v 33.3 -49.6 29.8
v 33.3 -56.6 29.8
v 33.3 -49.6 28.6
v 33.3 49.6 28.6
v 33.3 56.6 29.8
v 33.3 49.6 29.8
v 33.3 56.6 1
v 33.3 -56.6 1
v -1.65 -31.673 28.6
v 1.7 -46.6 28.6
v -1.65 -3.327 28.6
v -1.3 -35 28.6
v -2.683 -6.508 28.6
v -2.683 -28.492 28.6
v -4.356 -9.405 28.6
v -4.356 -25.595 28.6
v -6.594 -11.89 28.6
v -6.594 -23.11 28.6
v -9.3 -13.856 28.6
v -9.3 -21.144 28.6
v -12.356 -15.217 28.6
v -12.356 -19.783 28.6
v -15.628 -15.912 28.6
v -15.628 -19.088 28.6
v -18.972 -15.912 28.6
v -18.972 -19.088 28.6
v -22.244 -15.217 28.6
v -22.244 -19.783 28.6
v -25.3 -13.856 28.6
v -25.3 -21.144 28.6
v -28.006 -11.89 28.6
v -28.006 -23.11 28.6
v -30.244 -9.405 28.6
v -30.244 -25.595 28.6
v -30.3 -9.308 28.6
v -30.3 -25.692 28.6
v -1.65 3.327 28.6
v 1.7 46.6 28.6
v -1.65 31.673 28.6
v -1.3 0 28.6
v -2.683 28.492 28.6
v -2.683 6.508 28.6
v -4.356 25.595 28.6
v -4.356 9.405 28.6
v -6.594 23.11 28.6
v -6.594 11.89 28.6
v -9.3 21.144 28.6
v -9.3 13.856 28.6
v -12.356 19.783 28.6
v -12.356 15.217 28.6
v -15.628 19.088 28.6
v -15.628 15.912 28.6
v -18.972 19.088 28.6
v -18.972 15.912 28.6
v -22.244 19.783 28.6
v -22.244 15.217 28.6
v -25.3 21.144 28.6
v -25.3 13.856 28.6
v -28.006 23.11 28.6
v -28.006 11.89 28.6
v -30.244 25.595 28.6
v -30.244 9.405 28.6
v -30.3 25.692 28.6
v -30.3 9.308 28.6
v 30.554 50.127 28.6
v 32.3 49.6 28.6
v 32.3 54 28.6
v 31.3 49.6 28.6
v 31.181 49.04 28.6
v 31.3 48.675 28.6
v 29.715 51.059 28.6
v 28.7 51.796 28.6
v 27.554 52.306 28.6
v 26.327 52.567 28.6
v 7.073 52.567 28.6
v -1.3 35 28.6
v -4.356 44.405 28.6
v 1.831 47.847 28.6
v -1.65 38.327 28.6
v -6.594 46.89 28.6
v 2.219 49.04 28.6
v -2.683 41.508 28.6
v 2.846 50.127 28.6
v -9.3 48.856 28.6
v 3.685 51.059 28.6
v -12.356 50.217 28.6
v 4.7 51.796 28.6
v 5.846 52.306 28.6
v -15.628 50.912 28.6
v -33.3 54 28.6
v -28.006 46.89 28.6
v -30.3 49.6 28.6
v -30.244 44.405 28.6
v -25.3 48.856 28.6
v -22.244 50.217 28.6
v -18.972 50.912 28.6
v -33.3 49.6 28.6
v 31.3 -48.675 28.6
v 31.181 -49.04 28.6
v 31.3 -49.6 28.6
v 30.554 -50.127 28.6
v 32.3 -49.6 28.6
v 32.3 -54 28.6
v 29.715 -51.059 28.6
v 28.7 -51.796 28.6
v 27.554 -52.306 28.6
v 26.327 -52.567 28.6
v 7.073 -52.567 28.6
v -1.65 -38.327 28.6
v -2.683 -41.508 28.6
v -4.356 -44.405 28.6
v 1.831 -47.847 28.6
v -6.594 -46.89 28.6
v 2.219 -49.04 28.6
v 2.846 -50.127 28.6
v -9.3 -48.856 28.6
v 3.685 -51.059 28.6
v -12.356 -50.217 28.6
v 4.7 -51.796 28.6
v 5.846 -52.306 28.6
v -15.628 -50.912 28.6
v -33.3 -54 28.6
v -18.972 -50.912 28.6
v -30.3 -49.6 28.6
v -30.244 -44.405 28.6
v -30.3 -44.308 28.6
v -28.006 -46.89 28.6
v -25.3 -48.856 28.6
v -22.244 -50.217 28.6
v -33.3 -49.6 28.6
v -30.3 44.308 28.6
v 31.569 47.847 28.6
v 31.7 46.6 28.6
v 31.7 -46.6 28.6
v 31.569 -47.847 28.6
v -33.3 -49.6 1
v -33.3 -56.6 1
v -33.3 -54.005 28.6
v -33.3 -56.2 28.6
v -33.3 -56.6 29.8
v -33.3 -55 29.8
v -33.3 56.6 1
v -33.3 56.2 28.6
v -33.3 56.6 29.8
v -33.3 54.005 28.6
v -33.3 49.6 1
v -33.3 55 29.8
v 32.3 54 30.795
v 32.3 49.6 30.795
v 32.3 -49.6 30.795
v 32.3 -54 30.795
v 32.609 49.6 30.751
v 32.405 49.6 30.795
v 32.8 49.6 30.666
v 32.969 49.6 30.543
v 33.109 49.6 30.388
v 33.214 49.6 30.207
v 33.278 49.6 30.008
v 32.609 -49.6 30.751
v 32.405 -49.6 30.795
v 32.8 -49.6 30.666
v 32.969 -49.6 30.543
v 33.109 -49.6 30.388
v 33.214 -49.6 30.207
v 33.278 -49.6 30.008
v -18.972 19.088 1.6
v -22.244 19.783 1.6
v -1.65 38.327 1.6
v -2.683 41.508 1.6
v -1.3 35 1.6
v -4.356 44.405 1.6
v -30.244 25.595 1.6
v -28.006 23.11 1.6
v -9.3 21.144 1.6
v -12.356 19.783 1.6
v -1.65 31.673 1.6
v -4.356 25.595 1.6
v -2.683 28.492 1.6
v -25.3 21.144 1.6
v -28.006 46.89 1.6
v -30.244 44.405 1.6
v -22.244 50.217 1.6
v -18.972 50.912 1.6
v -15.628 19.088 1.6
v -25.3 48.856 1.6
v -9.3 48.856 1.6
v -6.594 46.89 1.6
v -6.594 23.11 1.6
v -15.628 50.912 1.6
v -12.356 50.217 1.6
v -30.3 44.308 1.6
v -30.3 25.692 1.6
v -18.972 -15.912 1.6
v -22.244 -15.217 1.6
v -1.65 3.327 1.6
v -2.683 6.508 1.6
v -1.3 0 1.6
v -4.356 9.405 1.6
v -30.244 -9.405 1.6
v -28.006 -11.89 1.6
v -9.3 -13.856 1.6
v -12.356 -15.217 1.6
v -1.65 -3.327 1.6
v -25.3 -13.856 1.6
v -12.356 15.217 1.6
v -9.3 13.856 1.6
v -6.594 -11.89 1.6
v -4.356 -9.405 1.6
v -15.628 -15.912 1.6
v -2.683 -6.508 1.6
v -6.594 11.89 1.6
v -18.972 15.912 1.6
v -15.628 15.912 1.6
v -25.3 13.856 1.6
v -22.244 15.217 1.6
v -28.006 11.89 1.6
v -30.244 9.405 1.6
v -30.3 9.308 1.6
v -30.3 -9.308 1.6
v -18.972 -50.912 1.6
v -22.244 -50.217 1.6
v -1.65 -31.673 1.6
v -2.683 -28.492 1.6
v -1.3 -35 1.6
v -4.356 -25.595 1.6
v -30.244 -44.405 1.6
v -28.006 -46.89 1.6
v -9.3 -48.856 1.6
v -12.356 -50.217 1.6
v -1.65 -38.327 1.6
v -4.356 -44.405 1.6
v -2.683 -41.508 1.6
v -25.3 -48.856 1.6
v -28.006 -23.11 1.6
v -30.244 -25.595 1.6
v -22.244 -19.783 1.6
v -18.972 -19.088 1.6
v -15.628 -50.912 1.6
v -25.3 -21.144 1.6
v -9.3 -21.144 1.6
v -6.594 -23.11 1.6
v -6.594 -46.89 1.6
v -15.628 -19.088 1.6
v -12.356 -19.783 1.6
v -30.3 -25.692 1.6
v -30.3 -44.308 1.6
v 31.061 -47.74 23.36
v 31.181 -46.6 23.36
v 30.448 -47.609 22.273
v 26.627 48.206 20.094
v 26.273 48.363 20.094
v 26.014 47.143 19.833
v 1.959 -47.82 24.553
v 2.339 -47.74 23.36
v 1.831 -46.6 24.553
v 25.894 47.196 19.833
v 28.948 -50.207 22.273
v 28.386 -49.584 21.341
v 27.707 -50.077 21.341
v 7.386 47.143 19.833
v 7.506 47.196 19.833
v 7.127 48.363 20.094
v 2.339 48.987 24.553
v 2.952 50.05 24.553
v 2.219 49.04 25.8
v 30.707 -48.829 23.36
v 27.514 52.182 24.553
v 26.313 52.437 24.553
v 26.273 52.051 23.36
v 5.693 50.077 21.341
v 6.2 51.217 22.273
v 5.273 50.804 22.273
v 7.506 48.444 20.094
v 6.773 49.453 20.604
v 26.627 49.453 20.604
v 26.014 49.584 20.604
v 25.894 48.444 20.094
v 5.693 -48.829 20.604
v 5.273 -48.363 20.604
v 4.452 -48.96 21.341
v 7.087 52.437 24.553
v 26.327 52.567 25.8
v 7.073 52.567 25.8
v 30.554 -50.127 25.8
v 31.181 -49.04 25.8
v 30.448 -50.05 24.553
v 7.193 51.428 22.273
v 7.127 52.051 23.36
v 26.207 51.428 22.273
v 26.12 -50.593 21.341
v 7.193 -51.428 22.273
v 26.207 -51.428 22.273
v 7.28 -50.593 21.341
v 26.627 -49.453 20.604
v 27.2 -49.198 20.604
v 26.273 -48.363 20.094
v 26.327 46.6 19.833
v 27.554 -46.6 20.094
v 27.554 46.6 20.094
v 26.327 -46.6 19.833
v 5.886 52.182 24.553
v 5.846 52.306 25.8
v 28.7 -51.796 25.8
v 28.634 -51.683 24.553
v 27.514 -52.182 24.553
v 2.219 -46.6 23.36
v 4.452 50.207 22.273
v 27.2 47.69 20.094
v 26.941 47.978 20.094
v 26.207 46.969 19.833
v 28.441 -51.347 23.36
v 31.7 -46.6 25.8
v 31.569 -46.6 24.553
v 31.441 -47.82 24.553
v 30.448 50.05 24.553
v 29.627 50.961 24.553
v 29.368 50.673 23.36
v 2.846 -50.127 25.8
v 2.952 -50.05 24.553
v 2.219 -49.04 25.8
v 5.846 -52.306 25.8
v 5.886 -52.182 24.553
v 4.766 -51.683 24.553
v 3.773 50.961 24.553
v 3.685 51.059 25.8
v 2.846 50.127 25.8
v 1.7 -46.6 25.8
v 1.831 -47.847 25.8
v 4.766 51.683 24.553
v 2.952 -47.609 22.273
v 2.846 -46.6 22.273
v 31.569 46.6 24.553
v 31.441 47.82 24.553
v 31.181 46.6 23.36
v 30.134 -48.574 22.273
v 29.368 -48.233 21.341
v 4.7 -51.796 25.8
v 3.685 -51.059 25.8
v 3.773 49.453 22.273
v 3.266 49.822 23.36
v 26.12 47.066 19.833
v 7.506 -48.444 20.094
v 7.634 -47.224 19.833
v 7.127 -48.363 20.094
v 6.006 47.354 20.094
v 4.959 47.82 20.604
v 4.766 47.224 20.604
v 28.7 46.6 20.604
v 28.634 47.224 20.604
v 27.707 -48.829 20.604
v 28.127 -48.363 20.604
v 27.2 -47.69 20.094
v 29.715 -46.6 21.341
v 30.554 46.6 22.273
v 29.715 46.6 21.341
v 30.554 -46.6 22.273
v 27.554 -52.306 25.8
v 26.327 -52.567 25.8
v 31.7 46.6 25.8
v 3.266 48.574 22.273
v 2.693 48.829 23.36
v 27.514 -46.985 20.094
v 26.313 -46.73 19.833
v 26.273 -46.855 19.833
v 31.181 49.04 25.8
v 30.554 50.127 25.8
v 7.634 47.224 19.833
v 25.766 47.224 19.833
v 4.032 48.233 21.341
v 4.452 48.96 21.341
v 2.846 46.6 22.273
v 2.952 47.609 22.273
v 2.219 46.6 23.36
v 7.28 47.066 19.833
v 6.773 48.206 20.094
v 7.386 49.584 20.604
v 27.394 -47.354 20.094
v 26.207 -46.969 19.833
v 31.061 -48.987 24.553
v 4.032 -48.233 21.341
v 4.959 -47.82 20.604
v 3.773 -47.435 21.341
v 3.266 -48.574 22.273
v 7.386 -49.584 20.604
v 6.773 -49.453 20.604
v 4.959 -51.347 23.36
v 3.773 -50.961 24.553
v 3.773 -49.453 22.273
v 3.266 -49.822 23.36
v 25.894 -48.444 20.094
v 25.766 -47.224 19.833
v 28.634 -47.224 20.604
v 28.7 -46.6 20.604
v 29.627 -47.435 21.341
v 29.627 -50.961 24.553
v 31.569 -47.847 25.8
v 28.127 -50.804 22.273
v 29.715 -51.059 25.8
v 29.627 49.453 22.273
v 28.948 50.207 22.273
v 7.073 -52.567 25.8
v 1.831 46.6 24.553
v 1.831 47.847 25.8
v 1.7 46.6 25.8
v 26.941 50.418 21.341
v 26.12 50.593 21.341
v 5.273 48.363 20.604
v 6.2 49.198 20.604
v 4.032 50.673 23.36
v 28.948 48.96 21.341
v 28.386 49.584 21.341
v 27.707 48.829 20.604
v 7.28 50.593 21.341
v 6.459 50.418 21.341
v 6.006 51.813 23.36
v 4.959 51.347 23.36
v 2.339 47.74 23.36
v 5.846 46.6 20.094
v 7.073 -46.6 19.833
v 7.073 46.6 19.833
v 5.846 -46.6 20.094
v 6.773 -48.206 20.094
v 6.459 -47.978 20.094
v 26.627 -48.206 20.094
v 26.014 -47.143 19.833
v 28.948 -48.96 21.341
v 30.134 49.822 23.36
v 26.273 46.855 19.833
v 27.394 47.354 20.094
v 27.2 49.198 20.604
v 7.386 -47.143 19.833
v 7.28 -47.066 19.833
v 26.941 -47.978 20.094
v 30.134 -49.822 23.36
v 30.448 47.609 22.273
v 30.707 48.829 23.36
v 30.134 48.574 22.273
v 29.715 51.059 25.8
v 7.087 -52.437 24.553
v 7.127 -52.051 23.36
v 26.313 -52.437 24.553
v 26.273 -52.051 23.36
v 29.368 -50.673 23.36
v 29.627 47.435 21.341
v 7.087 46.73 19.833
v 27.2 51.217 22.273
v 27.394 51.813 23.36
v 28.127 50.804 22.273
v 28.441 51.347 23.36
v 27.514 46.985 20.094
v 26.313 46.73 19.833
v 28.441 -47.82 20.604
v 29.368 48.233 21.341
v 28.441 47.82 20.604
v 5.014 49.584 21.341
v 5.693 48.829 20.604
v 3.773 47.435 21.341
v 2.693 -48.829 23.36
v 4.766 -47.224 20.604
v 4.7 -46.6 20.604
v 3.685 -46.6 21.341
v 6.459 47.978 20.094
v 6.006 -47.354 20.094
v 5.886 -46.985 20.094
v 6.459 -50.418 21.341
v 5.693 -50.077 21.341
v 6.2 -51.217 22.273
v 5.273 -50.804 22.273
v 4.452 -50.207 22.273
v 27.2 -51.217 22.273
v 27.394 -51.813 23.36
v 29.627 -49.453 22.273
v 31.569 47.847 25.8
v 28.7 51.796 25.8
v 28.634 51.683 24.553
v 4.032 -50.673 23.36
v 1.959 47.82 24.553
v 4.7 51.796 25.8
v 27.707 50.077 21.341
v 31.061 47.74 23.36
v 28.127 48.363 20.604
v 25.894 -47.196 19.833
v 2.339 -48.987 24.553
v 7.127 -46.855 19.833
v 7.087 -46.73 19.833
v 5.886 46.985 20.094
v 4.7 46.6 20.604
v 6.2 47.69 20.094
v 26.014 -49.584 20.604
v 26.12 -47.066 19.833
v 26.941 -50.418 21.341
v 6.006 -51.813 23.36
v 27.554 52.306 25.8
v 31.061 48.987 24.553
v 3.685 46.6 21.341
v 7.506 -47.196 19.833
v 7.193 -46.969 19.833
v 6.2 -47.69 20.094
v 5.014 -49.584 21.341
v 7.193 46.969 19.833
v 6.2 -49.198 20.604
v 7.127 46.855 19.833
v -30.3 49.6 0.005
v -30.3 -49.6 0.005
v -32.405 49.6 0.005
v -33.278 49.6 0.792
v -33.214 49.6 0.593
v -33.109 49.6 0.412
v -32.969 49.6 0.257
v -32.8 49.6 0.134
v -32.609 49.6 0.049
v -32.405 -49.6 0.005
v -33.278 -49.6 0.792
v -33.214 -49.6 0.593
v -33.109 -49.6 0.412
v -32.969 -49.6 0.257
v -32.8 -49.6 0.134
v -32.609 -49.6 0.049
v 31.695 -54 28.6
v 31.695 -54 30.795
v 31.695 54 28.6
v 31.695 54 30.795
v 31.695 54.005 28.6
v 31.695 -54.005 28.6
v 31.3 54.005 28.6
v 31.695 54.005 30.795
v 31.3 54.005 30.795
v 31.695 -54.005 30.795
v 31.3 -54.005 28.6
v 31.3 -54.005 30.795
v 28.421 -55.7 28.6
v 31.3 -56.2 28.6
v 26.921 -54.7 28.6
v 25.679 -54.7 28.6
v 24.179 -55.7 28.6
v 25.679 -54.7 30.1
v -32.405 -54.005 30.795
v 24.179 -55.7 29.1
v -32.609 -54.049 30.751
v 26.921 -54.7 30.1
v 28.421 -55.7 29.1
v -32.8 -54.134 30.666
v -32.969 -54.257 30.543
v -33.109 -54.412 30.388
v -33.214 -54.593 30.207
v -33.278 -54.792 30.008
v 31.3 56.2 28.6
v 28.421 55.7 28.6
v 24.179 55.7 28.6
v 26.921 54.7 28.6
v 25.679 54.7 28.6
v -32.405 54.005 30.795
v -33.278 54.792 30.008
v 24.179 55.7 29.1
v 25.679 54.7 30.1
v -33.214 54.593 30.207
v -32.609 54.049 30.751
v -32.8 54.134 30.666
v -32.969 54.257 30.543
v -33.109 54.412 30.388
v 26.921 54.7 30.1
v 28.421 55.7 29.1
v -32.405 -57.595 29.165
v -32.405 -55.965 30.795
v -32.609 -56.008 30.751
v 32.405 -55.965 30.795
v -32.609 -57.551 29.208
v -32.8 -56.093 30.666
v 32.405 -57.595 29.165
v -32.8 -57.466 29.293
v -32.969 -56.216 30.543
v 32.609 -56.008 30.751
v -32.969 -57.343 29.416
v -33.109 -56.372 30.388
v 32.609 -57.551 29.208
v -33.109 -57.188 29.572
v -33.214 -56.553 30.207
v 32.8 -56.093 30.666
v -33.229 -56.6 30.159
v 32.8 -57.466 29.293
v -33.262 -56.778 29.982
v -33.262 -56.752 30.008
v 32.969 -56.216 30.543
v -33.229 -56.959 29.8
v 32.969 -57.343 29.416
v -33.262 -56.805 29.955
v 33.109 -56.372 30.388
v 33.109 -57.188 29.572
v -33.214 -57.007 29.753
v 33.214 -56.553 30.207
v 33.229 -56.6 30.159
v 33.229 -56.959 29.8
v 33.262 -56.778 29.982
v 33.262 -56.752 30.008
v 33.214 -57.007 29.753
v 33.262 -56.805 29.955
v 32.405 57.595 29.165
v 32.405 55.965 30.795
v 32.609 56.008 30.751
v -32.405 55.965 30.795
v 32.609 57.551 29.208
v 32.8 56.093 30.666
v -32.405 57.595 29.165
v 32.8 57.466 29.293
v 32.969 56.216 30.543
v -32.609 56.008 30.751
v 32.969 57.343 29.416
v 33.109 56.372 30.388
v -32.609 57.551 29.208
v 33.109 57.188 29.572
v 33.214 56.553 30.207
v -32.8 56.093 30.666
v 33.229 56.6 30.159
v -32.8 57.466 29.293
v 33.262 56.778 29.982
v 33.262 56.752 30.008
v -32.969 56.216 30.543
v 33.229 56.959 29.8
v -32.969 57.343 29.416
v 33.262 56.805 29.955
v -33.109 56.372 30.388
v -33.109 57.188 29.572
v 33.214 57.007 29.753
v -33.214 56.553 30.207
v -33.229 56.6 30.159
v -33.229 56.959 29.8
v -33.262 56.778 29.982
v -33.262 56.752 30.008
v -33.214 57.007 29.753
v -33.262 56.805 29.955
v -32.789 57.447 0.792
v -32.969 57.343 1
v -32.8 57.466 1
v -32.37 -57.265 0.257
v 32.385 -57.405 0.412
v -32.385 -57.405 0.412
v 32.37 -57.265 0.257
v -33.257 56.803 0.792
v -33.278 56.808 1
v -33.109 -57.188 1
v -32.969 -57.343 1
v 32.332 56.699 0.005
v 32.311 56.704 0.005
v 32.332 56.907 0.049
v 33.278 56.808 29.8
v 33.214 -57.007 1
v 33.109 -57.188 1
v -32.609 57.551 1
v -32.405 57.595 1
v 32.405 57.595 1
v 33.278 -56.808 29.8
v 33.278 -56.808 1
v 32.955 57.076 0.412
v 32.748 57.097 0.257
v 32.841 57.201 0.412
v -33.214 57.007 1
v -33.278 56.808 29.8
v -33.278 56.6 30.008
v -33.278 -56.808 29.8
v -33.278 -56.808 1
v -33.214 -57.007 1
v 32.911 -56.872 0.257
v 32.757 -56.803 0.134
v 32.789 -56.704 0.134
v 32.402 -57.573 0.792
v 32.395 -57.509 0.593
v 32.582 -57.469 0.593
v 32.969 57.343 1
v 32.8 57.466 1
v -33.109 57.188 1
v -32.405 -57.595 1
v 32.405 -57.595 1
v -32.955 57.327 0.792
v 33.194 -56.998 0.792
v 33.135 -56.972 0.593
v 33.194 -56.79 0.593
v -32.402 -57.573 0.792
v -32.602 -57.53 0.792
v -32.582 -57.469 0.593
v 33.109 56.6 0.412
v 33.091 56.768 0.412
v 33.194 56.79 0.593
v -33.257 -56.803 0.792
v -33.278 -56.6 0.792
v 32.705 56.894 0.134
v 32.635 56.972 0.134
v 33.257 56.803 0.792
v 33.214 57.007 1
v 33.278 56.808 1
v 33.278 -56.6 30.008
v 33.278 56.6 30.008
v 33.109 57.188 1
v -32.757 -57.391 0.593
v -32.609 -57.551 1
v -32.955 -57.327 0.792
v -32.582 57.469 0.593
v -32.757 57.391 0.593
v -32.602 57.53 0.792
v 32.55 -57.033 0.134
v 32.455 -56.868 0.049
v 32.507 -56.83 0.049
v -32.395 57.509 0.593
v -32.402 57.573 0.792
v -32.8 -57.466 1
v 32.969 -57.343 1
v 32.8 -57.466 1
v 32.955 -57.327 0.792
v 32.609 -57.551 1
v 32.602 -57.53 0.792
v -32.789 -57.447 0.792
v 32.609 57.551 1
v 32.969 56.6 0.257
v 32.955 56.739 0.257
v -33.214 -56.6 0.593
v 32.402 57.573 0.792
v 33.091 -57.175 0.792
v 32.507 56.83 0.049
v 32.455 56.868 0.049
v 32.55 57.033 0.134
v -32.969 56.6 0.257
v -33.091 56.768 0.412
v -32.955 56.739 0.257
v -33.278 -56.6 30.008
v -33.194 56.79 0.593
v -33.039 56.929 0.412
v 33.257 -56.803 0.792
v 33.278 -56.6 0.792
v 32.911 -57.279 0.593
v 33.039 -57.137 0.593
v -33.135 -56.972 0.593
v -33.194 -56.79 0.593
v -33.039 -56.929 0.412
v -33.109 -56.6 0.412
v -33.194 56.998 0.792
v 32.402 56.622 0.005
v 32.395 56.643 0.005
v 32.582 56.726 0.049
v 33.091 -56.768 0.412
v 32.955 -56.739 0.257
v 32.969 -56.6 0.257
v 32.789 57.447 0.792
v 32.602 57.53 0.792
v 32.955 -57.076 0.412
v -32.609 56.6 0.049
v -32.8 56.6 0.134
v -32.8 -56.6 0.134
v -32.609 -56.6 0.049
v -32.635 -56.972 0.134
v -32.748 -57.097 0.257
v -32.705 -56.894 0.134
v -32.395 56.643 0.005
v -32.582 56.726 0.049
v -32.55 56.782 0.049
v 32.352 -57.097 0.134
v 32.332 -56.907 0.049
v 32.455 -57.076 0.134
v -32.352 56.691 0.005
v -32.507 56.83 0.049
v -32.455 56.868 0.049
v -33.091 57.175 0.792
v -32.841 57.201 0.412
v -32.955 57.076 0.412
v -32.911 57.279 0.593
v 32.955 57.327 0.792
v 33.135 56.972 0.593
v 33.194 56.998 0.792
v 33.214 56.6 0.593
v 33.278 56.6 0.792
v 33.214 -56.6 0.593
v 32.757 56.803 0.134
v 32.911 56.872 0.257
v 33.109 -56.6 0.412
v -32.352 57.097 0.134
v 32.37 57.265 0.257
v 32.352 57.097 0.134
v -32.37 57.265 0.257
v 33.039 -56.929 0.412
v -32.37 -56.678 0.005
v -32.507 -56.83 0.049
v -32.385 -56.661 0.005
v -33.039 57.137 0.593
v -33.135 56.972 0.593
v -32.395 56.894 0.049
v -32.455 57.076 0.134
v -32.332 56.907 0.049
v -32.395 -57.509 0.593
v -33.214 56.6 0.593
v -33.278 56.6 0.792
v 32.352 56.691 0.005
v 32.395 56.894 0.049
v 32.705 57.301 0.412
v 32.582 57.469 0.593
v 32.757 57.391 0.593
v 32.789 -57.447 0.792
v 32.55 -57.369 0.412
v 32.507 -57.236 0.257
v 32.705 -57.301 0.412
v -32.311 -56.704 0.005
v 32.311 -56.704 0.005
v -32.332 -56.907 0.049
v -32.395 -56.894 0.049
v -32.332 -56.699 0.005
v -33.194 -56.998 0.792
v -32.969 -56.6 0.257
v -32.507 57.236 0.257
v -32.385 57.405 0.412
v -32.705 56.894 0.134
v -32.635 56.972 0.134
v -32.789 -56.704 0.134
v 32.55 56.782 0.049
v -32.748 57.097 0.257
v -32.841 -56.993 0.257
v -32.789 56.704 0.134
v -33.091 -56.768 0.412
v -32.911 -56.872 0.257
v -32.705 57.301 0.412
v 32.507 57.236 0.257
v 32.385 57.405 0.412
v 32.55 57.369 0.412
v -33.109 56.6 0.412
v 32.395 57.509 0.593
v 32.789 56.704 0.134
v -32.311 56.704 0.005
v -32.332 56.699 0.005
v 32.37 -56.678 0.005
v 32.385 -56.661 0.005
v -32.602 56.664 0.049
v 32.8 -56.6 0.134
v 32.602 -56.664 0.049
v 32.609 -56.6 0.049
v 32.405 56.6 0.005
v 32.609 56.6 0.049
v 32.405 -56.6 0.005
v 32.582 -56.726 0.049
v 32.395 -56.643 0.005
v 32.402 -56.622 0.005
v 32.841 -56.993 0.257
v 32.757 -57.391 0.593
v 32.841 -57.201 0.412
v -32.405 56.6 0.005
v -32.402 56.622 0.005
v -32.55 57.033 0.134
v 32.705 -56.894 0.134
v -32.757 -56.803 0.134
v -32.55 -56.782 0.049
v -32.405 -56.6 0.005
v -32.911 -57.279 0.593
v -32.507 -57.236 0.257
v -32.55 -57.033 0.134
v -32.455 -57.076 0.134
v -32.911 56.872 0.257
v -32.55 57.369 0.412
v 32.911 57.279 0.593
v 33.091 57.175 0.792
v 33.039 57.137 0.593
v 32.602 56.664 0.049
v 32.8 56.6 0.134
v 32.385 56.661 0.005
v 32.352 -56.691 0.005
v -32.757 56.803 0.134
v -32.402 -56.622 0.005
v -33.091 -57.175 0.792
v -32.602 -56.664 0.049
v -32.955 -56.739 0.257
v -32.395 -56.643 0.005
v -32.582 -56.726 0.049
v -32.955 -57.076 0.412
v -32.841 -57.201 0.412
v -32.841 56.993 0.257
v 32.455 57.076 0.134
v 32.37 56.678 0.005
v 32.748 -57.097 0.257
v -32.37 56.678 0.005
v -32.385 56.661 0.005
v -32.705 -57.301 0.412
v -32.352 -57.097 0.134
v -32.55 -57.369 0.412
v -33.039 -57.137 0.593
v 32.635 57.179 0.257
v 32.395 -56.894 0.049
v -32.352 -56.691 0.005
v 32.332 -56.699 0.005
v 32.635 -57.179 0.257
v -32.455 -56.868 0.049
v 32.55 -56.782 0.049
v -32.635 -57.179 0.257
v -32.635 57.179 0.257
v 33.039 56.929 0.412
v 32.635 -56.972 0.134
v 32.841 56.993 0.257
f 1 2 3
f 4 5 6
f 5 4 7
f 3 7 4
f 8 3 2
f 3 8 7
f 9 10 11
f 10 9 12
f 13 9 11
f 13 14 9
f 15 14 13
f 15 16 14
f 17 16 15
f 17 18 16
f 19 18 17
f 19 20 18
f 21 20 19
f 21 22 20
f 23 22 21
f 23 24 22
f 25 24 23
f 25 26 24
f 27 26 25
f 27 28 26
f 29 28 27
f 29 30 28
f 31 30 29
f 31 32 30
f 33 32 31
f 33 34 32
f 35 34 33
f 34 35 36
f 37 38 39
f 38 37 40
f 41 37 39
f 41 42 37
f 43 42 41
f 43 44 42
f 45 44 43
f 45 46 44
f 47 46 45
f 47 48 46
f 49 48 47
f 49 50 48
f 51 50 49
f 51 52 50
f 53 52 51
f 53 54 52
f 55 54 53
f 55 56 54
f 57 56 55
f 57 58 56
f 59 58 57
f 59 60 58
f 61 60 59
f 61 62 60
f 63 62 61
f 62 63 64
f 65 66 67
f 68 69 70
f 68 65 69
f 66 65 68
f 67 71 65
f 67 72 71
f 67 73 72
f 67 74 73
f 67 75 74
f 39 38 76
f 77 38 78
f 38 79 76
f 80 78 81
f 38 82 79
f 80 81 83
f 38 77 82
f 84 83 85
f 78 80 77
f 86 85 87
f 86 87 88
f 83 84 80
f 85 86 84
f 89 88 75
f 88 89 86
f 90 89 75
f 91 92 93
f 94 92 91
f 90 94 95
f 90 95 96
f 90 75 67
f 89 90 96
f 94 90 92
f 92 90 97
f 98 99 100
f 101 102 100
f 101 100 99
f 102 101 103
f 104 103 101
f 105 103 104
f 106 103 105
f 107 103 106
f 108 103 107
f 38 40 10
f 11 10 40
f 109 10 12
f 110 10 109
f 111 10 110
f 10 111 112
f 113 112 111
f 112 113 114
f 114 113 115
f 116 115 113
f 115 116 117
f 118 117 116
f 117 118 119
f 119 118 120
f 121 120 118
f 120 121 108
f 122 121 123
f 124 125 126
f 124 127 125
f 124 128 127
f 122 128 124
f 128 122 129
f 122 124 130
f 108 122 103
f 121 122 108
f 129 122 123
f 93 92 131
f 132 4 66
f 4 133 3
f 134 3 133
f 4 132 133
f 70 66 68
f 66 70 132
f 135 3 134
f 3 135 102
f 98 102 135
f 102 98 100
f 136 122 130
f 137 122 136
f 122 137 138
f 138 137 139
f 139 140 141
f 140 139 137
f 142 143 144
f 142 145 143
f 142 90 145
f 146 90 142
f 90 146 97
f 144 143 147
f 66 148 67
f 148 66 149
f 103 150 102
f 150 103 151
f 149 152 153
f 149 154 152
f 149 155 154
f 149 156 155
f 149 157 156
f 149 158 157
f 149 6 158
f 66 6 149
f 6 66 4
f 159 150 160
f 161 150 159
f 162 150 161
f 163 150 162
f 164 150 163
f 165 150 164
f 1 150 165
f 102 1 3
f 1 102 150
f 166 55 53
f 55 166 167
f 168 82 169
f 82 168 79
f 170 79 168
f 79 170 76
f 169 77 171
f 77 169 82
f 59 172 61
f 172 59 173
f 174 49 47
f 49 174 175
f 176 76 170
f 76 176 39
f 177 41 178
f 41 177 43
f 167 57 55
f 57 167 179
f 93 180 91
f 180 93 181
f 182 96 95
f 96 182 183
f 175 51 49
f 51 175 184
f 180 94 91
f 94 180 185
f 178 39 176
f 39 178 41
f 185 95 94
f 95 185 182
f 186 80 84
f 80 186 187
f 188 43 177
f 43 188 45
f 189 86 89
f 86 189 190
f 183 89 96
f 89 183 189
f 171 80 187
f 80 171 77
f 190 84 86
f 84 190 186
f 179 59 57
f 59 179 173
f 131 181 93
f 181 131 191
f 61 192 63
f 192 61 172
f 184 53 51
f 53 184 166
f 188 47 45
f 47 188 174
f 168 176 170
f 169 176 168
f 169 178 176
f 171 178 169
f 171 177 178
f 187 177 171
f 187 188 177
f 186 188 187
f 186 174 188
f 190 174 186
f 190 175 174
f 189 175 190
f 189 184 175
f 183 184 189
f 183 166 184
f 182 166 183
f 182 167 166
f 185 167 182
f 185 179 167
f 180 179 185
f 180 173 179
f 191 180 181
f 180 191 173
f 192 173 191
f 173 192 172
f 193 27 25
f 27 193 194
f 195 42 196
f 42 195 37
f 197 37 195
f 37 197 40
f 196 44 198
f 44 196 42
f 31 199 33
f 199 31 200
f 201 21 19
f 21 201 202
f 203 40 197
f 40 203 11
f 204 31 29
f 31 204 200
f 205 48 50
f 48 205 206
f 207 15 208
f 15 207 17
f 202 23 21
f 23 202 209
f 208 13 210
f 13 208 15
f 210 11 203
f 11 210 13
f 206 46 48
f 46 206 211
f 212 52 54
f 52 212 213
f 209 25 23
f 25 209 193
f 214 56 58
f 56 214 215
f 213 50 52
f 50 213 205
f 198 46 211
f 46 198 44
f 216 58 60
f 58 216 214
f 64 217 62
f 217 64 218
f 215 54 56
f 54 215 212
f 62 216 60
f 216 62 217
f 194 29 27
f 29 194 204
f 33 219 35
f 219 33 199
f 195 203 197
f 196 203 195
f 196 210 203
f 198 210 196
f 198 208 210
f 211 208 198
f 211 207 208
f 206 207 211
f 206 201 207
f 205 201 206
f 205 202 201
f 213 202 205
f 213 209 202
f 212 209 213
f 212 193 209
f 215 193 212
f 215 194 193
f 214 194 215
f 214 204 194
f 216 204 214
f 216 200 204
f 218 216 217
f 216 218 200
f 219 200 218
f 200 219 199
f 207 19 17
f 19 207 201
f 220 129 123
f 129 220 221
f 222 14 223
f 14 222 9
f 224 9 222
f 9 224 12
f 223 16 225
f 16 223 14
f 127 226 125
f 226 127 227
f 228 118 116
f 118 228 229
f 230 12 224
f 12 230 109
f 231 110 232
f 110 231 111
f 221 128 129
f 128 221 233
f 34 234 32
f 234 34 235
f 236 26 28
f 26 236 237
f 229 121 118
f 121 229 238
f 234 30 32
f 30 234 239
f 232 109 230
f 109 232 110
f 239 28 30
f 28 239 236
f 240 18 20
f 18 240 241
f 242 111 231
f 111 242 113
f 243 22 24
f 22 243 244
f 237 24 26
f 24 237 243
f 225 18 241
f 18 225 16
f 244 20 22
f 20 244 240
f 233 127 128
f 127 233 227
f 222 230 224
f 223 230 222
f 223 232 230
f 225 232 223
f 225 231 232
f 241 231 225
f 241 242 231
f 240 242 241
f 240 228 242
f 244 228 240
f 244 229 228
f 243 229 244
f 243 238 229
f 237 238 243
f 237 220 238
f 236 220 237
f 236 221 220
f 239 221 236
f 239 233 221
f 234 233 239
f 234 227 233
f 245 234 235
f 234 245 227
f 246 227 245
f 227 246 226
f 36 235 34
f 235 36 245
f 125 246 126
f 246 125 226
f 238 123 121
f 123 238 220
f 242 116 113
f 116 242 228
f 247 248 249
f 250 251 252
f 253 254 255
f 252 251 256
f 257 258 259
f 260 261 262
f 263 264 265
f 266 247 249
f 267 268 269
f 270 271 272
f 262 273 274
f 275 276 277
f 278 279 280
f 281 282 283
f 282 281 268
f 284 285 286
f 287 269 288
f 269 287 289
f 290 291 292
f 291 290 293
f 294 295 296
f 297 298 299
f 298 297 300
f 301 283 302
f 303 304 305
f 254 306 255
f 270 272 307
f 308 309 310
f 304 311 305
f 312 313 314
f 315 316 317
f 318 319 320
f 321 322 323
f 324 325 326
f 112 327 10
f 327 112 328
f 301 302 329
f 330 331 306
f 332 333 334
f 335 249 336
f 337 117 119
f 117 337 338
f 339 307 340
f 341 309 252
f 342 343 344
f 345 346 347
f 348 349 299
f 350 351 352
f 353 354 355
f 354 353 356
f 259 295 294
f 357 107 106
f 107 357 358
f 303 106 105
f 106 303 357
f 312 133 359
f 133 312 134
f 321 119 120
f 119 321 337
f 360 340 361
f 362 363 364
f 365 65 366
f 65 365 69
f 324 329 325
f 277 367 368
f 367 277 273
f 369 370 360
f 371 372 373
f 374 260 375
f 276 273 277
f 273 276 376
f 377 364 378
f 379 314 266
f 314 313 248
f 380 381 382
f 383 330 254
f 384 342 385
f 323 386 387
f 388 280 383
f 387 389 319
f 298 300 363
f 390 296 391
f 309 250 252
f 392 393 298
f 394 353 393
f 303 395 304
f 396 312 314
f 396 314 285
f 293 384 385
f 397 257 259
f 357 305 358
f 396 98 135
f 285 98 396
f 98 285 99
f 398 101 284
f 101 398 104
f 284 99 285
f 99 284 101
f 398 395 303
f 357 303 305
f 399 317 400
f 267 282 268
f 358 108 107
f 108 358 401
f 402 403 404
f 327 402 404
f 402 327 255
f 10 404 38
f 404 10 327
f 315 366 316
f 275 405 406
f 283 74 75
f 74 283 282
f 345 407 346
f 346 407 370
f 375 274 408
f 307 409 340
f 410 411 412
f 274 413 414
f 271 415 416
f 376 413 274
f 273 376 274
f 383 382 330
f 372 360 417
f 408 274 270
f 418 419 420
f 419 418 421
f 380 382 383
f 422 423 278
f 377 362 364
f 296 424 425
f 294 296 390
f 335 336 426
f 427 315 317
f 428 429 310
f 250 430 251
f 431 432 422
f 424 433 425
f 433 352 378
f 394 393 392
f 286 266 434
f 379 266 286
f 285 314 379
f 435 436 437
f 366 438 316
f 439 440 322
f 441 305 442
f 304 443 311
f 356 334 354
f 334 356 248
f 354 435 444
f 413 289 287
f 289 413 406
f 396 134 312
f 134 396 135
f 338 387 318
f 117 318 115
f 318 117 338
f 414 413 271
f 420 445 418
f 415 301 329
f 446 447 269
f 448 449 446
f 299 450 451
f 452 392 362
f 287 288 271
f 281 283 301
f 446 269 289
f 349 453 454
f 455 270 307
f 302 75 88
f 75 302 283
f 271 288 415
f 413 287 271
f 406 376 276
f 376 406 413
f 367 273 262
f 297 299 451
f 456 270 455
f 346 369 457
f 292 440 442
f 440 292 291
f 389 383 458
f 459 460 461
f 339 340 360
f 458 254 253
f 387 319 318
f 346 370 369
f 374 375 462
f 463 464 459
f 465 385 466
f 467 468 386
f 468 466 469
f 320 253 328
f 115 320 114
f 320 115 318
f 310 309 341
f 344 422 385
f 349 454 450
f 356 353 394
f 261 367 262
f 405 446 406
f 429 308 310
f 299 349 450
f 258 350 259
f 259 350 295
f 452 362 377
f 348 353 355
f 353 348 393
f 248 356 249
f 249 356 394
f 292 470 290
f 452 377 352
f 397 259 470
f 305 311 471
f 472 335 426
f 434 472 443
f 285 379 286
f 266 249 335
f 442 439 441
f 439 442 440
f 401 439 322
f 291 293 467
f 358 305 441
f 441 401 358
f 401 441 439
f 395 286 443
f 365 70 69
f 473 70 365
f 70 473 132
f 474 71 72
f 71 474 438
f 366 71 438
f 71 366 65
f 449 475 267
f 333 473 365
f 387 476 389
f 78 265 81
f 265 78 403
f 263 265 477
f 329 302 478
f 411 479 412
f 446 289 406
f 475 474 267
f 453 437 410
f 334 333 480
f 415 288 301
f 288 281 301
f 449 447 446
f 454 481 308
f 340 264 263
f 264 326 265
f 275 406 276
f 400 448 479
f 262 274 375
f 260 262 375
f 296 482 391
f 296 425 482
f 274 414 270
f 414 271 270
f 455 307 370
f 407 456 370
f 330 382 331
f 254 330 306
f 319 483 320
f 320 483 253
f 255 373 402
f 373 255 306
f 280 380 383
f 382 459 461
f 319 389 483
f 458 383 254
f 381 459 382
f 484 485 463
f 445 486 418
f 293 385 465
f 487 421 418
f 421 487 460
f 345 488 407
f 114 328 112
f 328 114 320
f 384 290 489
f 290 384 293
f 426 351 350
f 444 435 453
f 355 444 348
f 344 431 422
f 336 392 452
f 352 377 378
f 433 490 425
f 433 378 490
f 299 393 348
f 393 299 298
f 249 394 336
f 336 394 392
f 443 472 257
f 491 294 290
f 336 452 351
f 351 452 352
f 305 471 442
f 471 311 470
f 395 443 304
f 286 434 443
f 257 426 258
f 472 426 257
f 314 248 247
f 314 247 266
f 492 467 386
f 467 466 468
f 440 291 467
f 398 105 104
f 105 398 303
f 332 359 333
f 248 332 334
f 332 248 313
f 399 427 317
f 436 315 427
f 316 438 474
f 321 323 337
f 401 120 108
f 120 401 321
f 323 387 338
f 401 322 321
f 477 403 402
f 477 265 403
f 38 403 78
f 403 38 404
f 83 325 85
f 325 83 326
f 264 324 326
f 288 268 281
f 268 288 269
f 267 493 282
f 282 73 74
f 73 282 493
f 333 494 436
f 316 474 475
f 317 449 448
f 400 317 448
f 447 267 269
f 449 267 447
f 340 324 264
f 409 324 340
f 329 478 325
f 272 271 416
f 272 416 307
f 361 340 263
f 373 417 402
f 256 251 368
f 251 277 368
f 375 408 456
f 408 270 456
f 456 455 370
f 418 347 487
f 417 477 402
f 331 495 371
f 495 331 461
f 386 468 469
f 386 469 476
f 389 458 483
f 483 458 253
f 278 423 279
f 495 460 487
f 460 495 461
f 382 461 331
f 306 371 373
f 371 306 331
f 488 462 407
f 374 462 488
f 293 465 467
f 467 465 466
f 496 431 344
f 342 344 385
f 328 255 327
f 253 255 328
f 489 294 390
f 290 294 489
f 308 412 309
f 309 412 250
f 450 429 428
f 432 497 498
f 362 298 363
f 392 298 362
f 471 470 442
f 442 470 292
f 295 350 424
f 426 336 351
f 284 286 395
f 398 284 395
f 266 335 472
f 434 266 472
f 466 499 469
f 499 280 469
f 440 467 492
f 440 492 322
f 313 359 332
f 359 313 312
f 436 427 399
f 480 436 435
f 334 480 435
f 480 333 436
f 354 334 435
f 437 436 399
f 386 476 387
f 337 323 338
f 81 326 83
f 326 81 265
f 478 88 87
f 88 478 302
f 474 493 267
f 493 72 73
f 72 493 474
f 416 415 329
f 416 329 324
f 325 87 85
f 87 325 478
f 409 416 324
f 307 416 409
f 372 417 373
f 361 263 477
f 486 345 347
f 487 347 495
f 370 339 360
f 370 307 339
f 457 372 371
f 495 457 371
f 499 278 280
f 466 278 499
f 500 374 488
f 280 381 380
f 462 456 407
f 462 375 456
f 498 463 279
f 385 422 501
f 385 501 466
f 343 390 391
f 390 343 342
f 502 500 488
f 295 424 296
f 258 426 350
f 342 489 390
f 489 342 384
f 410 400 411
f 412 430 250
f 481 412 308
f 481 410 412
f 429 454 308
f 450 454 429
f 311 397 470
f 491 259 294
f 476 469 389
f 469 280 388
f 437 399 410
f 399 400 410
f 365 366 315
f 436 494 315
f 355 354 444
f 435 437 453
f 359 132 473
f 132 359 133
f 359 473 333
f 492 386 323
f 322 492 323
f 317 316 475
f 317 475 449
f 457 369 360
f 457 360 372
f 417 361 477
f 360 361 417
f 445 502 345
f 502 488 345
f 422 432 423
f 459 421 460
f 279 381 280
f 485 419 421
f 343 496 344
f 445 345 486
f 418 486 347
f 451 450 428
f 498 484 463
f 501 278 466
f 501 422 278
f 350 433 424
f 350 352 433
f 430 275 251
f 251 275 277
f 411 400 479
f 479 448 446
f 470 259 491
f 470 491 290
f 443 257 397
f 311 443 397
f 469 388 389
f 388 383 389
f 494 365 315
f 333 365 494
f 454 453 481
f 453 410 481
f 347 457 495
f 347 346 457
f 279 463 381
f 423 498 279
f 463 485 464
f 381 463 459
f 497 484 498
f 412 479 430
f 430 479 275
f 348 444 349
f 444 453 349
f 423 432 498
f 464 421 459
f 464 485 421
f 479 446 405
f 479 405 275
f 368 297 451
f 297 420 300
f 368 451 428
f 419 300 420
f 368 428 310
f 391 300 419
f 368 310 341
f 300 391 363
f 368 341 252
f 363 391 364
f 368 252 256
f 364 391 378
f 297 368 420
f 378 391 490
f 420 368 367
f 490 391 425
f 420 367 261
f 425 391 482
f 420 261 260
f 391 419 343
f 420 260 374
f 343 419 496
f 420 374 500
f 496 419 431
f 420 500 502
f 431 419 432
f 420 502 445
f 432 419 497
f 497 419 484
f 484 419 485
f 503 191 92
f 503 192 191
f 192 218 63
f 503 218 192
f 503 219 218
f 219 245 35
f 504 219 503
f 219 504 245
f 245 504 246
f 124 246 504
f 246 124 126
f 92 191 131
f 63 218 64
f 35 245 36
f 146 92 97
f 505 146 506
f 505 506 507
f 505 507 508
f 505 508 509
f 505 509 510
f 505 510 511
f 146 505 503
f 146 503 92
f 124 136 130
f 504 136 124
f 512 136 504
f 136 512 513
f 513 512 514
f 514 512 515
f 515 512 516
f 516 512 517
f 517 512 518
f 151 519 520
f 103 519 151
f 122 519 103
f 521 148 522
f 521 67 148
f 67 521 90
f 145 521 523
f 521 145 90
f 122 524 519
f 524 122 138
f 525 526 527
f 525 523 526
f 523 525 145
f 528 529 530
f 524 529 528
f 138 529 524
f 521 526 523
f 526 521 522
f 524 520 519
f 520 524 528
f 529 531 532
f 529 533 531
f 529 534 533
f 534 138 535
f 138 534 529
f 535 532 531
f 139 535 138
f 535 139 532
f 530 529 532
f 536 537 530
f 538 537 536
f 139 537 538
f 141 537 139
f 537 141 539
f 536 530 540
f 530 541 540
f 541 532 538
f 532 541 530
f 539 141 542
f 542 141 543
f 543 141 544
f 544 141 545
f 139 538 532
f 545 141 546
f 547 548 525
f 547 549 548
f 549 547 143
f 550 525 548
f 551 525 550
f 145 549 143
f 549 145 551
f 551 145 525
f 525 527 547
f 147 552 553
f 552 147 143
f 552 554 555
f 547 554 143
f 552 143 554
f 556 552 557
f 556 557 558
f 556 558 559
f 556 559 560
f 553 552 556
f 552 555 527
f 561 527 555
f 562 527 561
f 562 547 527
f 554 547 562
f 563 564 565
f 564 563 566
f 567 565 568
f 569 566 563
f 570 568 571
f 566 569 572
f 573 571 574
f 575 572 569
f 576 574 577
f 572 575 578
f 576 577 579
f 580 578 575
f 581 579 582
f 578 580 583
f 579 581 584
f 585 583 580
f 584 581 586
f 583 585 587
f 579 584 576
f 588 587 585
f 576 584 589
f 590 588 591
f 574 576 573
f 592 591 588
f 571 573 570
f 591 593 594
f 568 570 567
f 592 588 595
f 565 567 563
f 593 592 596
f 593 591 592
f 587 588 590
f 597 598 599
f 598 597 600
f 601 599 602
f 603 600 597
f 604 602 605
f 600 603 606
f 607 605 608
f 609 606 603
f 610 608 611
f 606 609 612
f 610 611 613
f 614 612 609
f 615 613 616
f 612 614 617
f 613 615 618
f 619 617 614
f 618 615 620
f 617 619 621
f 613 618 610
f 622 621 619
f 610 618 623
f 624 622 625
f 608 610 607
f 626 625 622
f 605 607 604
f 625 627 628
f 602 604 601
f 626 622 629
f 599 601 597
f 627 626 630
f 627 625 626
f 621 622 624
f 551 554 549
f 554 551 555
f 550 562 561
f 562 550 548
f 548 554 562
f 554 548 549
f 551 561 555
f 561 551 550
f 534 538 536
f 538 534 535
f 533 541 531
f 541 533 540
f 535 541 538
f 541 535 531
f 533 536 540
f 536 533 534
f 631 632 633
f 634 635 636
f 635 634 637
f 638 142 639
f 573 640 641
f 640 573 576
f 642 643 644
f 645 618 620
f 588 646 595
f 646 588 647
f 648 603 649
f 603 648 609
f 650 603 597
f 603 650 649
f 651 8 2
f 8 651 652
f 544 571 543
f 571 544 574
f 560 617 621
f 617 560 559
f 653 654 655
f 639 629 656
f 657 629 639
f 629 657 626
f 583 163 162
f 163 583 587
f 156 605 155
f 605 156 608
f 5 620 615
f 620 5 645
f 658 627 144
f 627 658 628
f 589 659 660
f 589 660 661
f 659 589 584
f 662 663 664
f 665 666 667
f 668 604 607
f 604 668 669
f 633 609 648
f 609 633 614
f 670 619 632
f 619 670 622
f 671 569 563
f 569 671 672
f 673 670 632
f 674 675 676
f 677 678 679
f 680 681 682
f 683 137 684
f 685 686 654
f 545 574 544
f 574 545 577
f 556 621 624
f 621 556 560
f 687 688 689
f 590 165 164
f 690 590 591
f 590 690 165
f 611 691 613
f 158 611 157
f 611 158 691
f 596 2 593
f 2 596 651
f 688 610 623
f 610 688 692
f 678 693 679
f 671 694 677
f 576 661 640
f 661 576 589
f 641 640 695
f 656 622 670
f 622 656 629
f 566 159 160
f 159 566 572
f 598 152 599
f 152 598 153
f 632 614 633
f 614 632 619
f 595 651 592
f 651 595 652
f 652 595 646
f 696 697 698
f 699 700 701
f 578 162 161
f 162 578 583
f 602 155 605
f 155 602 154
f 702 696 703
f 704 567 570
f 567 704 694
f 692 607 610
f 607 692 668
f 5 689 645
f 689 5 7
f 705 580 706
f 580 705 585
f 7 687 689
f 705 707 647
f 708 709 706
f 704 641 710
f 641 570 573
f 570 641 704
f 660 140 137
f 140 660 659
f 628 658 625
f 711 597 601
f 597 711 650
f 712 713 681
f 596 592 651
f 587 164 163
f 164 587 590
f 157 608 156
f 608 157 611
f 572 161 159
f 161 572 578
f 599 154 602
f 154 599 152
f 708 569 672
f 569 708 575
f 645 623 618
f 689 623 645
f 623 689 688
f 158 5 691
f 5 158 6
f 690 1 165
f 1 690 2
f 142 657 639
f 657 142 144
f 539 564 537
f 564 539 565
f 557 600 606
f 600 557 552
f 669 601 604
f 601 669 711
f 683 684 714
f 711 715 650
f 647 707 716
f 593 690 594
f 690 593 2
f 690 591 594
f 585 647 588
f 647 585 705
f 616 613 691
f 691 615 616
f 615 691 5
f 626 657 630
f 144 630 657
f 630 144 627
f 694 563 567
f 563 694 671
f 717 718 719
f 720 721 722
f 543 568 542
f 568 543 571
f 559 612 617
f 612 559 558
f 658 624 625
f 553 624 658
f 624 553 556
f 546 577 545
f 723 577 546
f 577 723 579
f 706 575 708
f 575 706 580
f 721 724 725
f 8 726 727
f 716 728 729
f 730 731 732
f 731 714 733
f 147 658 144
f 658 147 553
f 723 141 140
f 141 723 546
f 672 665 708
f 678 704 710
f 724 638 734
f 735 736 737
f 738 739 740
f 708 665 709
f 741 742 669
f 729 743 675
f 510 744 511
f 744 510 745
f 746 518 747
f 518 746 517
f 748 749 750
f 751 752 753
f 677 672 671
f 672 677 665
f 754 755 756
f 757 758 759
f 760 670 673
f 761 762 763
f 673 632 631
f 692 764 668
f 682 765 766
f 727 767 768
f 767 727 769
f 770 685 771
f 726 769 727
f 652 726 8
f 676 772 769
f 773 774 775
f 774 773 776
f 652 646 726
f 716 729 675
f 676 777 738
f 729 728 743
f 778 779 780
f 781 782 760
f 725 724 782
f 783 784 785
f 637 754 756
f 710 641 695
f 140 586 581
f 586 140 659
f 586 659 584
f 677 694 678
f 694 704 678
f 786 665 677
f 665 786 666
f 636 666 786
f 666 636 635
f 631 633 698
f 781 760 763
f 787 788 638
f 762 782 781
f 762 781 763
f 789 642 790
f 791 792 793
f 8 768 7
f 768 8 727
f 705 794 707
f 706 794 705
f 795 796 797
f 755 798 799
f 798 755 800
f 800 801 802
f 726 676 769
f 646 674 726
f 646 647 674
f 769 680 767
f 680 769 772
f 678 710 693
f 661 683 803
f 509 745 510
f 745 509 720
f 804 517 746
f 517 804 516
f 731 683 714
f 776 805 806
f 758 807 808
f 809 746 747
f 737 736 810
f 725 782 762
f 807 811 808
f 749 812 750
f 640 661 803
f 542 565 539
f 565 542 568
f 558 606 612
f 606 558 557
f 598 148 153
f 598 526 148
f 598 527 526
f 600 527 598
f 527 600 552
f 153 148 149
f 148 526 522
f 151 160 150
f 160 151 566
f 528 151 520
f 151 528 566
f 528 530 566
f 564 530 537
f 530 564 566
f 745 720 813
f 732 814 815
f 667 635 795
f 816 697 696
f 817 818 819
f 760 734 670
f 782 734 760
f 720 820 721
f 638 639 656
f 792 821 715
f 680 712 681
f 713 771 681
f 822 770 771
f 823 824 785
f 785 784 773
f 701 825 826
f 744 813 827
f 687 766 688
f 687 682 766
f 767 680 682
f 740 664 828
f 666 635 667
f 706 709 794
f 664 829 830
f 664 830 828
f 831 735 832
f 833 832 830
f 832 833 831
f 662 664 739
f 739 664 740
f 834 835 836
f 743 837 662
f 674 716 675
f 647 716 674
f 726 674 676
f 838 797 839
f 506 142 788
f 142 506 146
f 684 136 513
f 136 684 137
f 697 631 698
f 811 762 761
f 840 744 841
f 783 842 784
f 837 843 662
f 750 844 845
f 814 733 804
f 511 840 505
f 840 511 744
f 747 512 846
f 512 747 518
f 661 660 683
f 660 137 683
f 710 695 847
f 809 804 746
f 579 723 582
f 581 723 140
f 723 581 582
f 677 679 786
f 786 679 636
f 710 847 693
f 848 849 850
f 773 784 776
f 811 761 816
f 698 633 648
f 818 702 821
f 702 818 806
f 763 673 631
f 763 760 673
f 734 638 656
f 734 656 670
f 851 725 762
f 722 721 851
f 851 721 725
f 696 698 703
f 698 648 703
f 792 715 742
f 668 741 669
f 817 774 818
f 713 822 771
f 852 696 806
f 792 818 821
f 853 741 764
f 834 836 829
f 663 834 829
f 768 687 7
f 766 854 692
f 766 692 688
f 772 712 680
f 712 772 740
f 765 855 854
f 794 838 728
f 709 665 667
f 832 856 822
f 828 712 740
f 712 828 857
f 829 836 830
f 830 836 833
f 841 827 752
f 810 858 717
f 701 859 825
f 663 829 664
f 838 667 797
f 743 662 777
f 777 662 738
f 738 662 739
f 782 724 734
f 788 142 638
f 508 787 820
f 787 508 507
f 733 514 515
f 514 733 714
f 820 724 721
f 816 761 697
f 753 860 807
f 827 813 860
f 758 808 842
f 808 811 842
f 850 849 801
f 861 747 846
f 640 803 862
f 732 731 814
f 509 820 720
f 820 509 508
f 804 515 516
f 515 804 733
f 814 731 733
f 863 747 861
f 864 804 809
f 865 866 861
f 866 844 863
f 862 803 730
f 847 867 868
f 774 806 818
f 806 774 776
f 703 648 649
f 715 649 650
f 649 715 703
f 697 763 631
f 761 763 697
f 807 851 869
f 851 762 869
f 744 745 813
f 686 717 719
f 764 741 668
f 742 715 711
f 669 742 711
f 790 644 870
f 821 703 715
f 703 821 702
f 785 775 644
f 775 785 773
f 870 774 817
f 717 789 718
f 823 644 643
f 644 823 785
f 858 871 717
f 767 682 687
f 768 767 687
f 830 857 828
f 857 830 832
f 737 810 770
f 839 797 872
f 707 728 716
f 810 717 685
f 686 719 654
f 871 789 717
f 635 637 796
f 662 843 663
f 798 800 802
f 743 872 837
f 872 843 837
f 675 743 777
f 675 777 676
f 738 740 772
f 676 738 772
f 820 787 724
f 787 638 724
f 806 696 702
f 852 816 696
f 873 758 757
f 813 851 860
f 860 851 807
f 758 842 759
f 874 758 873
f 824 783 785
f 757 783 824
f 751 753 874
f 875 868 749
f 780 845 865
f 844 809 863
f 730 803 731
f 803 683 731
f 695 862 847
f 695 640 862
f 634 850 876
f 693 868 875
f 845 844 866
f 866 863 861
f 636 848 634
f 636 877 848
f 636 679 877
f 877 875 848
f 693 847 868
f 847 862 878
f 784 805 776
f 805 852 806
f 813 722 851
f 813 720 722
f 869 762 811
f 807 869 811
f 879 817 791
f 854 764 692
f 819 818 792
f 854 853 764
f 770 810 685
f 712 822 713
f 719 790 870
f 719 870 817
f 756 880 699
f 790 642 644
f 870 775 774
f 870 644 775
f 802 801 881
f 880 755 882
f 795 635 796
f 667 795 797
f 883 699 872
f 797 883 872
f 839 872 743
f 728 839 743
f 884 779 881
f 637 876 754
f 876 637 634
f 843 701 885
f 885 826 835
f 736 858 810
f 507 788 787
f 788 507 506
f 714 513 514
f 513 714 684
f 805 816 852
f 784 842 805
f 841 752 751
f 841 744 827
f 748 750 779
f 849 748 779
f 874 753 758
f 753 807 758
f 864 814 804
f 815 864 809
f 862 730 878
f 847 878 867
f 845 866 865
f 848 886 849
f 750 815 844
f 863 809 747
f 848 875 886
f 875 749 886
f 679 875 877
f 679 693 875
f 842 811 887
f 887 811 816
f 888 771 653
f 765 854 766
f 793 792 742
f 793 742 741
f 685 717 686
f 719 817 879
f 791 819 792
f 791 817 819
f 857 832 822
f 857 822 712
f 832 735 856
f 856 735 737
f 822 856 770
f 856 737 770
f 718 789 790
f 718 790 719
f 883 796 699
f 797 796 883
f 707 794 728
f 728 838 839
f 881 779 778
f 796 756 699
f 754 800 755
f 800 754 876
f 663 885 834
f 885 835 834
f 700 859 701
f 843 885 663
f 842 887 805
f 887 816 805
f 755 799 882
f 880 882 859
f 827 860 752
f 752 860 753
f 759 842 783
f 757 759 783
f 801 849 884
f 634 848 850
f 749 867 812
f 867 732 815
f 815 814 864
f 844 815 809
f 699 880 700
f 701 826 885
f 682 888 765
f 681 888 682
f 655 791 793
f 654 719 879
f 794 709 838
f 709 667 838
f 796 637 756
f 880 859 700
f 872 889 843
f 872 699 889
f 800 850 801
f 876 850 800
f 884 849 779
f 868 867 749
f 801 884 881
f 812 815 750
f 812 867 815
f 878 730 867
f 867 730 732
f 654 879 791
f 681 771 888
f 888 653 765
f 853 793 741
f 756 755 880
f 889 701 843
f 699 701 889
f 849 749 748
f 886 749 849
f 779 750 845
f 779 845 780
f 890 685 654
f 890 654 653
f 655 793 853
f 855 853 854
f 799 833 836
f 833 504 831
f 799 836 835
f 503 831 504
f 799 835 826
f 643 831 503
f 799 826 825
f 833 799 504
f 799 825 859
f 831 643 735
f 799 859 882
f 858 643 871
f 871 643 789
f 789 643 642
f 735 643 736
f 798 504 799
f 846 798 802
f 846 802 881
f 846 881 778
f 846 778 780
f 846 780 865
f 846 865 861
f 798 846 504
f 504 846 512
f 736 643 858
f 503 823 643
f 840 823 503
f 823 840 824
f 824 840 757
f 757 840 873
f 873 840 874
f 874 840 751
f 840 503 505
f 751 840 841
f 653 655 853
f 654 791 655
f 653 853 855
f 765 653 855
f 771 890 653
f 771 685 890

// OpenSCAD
$fn=30;

/* [Global] */

// Render
Objects = "Box"; //  [Both, Box, Lid]
// Type of lid pattern
gPattern = "Diamond"; //  [Hex, Diamond, Solid, Fancy]
// Tolerance
gTol = 0.3;
// Wall Thickness
gWT = 1.6;

//  padded mini 8 in x, and 2 in y  to give it a lip
MachineR = 16;
MachineZ = 27;

LightningX = 30;
LightningZ = 11;

BinSeperation = 3;

/* [Hidden] */
/* Private variables */

// Box Height

LidH = 2.2;
RailThick = 1.4;
RailWidth = LidH + RailThick;

function SumList(list, start, end) = (start == end) ? 0 : list[start] + SumList(list, start+1, end);
// Box Length
TotalX = 2*MachineR + BinSeperation+LightningX + gWT ;
// Box Width 10 mm pad between skill and level for finger slot
TotalY = 2*RailWidth + 6*MachineR + 4*BinSeperation;
TotalZ = gWT + MachineZ + LidH;


echo("Size: ",TotalX,TotalY, TotalZ);
   
// Height not counting the lid
AdjBoxHeight = TotalZ - LidH;

 module regular_polygon(order, r=1){
 	angles=[ for (i = [0:order-1]) i*(360/order) ];
 	coords=[ for (th=angles) [r*cos(th), r*sin(th)] ];
 	polygon(coords);
 }

module diamond_lattice(ipX, ipY, DSize, WSize)  {

    lOffset = DSize + WSize;

	difference()  {
		square([ipX, ipY]);
		for (x=[0:lOffset:ipX]) {
            for (y=[0:lOffset:ipY]){
  			   translate([x, y])  regular_polygon(4, r=DSize/2);
			   translate([x+lOffset/2, y+lOffset/2]) regular_polygon(4, r=DSize/2);
		    }
        }        
	}
}

module circle_lattice(ipX, ipY, Spacing=10, Walls=1.2)  {


   intersection() {
      square([ipX,ipY]); 
      union() {
	    for (x=[-Spacing:Spacing:ipX+Spacing]) {
           for (y=[-Spacing:Spacing:ipY+Spacing]){
	          difference()  {
			     translate([x+Spacing/2, y+Spacing/2]) circle(r=Spacing*0.75);
			     translate([x+Spacing/2, y+Spacing/2]) circle(r=(Spacing*0.75)-Walls);
		      }
           }   // end for y        
	    }  // end for x
      } // End union
   }
}

module football() {
    scale([0.7,0.7])
    intersection(){
        translate([-4,0]) circle(6);
        translate([4,0]) circle(6);
    }
}

module RCube(x,y,z,ipR=4) {
    translate([-x/2,-y/2,0]) hull(){
      translate([ipR,ipR,ipR]) sphere(ipR);
      translate([x-ipR,ipR,ipR]) sphere(ipR);
      translate([ipR,y-ipR,ipR]) sphere(ipR);
      translate([x-ipR,y-ipR,ipR]) sphere(ipR);
      translate([ipR,ipR,z-ipR]) sphere(ipR);
      translate([x-ipR,ipR,z-ipR]) sphere(ipR);
      translate([ipR,y-ipR,z-ipR]) sphere(ipR);
      translate([x-ipR,y-ipR,z-ipR]) sphere(ipR);
      }  
} 

module lid(ipPattern = "Hex", ipTol = 0.3){
  lAdjX = TotalX;
  lAdjY = TotalY-RailWidth*2-ipTol*2;  
  lAdjZ = LidH;
  CutX = lAdjX - 8;
  CutY = lAdjY - 8;
  lFingerX = 15;
  lFingerY = 16;  

  // main square with center removed for a pattern. 0.01 addition is a kludge to avoid a 2d surface remainging when substracting the lid from the box.
         difference() {
      translate([0,0,lAdjZ/2]) cube([lAdjX+0.01, lAdjY+0.01 , lAdjZ], center=true);

      translate([0,0,lAdjZ/2]) cube([CutX, CutY, lAdjZ], center = true);
      translate([TotalX/2-gWT/2,0,LidH/2])cube([gWT+0.01,TotalY-RailWidth,LidH],center=true);

     // make a slot for the latch can flex         
     translate([TotalX/2,TotalY/2-RailWidth-1.4,-1]) RCube(18,0.8,4,0.4);
     translate([TotalX/2,-TotalY/2+RailWidth+1.4,-1]) RCube(18,0.8,4,0.4);
  }
  
  // The Side triangles
  difference() {
    intersection () {
      union () {
          translate([-lAdjX/2,-lAdjY/2-LidH,LidH]) rotate([0,90,0]) linear_extrude(TotalX-2) polygon([[LidH,0],[LidH,LidH],[0,LidH]], paths=[[0,1,2]]);
          translate([-lAdjX/2,lAdjY/2,LidH]) rotate([0,90,0]) linear_extrude(TotalX-2) polygon([[0,0],[LidH,0],[LidH,LidH]], paths=[[0,1,2]]);
      }
      
      // check if this is real lid (ipTol>0) or negative lid (iptol = 0)
      // if real lid remove center for pattern and remove latches
      if (ipTol>0) 
         {cube([lAdjX, lAdjY + 2*LidH-0.2, lAdjZ*2], center=true);}
    }
       
    if (ipTol>0)
    {
        // cut out slots for the latch 
        translate([TotalX/2-7,lAdjY/2+RailWidth/2+ipTol,LidH/2]) scale([1.5,1,1]) rotate([0,0,45]) cube ([2+ipTol,2+ipTol,LidH+1],center=true);
          
        translate([TotalX/2-7,-lAdjY/2-RailWidth/2-ipTol,LidH/2]) scale([1.5,1,1]) rotate([0,0,45]) cube ([2+ipTol,2+ipTol,LidH+1],center=true);
  
        // trip the rail to ease going past the nub
        translate([TotalX/2,TotalY/2-LidH/2-ipTol,0]) cube([12,LidH,LidH*2],center=true); 
        translate([TotalX/2,-TotalY/2+LidH/2+ipTol,0]) cube([12,LidH,LidH*2],center=true); 
    }
    
  }
 
  // Finger slot
  difference () {
      translate([-CutX/2,-lFingerY/2,0]) cube([lFingerX, lFingerY, lAdjZ]); 
      translate([-CutX/2+lFingerX/2,0,20+LidH/2])sphere(20);     
  }

  // Diamond top
  if (ipPattern == "Diamond") 
    {
      difference (){ 
        translate([-CutX/2,-CutY/2,0]) linear_extrude(height = lAdjZ) diamond_lattice(CutX,CutY,7,2);
        translate([-CutX/2,-lFingerY/2,0]) cube([lFingerX, lFingerY, lAdjZ]); 
                }
    }
}


module box () {
//  Main Box
    
  difference() {   
     union(){
        // main box 
        translate ([0,0,AdjBoxHeight/2]) cube([TotalX,TotalY,AdjBoxHeight], center = true);
        // add backstop
        translate([TotalX/2-1/2,0,TotalZ-LidH/2])cube([1,TotalY-RailWidth,LidH],center=true);
     }

    // limit backdrop
     translate([TotalX/2,0,AdjBoxHeight+5])cube([4,TotalY-16,10],center=true);

    // Scope out compartment areas
     translate([-TotalX/2+MachineR,BinSeperation + 2*MachineR,gWT]) cylinder(h=MachineZ, r=MachineR);
     translate([-TotalX/2+MachineR, 0,gWT]) cylinder(h=MachineZ, r=MachineR);
     translate([-TotalX/2+MachineR, -BinSeperation - 2*MachineR,gWT]) cylinder(h=MachineZ, r=MachineR);

    // lightning bolt area
     translate([TotalX/2-LightningX/2-gWT, 0,TotalZ-LightningZ]) RCube(LightningX,TotalY-10,TotalZ,6);

    // access from side  TODO make granual
     translate([-TotalX/2,0,AdjBoxHeight/2])cube([6,TotalY-16,AdjBoxHeight],center=true);

  }


  // top rails
  difference() {
      union() {
          translate([0,-TotalY/2+RailWidth/2,AdjBoxHeight+LidH/2]) cube([TotalX,RailWidth,LidH],center = true);  
          translate([0,TotalY/2-RailWidth/2,AdjBoxHeight+LidH/2]) cube([TotalX,RailWidth,LidH],center = true);
           }
       
      // Trim each rail top to a 45 degree angle     
      translate([0,-TotalY/2,AdjBoxHeight+RailWidth]) rotate([45,0,0]) cube([TotalX,RailWidth+0.7,RailWidth+0.7], center=true); 
      translate([0,TotalY/2,AdjBoxHeight+RailWidth])  rotate([45,0,0]) cube([TotalX,RailWidth+0.7,RailWidth+0.7], center=true);  

      // Substract the lid from the rails
      translate([0,0,AdjBoxHeight]) lid(ipPattern = "Solid",ipTol =0);      
  }  
  

  
  // create the latches 
    translate([TotalX/2-7,TotalY/2-0.1-RailWidth/2,TotalZ-LidH/2]) scale([1.5,1,1]) difference(){
      rotate([0,0,45]) cube ([2,2,LidH+1],center=true);
      translate([0,2,0]) cube ([4,4,LidH+2],center=true);
      translate([0,-2,0])cube([2,2,LidH+2], center=true);
      }  
    translate([TotalX/2-7,-TotalY/2+0.1+RailWidth/2,TotalZ-LidH/2]) scale([1.5,1,1]) difference(){
      rotate([0,0,45]) cube ([2,2,LidH+1],center=true);
      translate([0,-2,0]) cube ([4,4,LidH+2],center=true);
      translate([0,2,0])cube([2,2,LidH+2], center=true);
      }

  
} 

// Production Box
if ((Objects == "Both") || (Objects == "Box")){
  intersection() {
     box();
     RCube(TotalX,TotalY,TotalZ,1);
  }
}

// Production Lid
if (Objects == "Both"){
  translate([-TotalX - 10,0,0]) lid(ipPattern = gPattern, ipTol = gTol);
}

// Production Lid
if (Objects == "Lid"){
  lid(ipPattern = gPattern, ipTol = gTol);
}
